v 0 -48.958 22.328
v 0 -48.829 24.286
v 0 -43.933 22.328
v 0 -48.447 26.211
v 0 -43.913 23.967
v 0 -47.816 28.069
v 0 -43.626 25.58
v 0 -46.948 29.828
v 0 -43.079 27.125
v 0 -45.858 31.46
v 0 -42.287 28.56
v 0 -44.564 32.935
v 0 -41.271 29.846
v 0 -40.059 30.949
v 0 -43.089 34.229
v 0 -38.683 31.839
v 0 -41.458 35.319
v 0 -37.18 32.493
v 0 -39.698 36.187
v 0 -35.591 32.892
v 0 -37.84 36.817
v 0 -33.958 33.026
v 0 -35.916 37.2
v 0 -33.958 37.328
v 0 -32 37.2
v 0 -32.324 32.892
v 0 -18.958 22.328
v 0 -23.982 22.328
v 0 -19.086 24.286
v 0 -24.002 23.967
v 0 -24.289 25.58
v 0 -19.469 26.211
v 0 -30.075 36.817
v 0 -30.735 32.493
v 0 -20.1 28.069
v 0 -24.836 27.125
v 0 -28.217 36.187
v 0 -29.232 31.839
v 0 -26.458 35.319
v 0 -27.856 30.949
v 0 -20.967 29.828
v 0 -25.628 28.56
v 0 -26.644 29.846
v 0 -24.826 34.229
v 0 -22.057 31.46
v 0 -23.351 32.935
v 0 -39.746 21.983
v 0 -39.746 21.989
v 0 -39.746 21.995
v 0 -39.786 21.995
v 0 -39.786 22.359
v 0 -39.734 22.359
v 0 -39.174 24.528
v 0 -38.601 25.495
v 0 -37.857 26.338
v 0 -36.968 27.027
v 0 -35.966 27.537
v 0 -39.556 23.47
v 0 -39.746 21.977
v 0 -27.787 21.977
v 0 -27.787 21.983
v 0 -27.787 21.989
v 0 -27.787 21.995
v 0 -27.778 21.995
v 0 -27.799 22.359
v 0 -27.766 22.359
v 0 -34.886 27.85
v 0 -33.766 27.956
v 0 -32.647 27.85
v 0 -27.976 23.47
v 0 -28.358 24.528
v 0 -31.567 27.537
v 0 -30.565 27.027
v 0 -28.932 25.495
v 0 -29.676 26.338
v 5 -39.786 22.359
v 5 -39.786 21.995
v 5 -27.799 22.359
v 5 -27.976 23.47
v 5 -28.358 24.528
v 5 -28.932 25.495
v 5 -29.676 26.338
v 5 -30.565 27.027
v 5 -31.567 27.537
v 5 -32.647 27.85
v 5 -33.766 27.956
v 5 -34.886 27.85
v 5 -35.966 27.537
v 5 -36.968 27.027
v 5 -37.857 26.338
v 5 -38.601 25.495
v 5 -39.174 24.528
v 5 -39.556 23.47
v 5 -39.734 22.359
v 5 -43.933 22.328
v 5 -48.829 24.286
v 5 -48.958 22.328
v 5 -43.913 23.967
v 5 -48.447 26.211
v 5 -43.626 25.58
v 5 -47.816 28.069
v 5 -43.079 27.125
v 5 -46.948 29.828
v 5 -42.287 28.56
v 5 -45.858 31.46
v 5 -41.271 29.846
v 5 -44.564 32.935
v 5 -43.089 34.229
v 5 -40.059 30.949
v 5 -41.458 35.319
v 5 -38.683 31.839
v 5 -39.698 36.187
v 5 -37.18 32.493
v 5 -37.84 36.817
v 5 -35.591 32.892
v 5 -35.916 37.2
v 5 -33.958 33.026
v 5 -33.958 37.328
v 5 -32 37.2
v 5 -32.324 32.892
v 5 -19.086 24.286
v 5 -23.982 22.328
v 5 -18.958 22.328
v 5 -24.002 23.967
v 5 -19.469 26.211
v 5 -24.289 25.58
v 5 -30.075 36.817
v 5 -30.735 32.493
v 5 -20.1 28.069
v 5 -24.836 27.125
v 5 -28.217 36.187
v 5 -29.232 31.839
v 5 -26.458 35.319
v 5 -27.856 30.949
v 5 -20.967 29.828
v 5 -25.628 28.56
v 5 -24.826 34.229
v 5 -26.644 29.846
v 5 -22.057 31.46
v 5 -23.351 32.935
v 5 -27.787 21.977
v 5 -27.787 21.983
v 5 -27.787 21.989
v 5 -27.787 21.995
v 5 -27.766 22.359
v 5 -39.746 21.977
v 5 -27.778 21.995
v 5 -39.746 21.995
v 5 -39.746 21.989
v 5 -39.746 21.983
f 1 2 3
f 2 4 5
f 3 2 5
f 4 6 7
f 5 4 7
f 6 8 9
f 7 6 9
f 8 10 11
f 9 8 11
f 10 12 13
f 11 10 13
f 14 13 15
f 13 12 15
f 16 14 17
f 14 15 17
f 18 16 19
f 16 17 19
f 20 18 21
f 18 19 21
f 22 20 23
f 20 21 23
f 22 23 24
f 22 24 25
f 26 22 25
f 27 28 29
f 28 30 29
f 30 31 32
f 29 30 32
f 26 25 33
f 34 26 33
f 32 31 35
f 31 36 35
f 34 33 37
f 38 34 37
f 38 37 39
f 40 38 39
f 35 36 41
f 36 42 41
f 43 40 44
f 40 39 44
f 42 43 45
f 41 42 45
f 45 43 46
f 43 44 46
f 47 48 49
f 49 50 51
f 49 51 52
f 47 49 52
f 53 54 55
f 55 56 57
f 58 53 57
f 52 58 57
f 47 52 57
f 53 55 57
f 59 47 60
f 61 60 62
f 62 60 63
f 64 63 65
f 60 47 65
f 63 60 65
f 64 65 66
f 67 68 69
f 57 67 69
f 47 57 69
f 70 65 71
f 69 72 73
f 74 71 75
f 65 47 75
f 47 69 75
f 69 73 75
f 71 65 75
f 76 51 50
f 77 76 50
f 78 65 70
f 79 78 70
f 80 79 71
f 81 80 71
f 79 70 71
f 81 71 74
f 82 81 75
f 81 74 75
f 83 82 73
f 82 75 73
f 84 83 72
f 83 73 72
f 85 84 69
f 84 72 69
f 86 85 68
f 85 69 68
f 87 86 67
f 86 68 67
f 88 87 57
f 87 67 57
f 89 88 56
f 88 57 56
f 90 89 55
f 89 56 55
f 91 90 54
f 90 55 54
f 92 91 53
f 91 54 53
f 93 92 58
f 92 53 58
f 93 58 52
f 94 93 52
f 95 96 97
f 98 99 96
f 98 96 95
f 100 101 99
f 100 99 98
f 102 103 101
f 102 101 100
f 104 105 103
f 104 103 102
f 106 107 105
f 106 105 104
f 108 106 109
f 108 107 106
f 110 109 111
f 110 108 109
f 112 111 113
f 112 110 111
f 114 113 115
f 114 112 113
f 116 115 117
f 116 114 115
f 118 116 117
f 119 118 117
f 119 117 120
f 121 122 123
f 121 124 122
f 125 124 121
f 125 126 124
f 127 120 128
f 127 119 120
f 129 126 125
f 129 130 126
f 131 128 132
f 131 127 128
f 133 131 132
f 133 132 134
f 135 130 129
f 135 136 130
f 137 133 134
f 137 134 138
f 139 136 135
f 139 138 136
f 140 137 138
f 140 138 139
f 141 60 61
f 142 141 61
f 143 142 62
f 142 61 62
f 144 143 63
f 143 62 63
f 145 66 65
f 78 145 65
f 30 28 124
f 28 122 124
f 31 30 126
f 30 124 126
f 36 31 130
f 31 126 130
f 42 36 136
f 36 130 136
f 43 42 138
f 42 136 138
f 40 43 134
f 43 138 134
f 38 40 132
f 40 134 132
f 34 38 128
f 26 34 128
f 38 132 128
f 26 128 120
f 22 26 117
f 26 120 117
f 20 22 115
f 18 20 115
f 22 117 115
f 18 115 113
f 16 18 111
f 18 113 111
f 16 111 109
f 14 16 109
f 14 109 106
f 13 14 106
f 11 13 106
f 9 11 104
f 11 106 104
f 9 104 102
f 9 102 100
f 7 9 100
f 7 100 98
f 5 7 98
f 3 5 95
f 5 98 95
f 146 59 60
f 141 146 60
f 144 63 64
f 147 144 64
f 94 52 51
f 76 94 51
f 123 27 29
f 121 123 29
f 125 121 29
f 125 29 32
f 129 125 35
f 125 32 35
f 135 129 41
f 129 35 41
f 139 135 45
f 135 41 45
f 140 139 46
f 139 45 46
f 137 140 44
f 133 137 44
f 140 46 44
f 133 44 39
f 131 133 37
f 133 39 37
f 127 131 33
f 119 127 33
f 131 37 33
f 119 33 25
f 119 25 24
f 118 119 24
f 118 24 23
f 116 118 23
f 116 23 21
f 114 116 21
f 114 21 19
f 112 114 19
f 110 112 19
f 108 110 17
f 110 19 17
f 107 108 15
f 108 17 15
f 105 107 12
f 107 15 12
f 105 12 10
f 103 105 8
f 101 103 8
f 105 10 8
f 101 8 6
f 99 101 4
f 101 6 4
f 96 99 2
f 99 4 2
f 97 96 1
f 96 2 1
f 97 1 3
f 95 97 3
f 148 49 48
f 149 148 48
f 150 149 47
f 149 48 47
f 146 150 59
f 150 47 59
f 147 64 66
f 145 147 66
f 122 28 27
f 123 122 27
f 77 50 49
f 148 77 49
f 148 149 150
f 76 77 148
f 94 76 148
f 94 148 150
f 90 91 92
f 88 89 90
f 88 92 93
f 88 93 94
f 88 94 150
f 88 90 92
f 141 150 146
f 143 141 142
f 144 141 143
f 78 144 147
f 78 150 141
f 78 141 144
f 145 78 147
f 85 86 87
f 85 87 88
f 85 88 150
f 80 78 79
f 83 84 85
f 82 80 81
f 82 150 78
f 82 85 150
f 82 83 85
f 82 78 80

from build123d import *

# Parameters (mm, degrees)
F1_DEPTH = 5
F3_D     = 20
F5_DEPTH = 5
F7_DEPTH = 5


with BuildPart() as f1:
    # F0 (on Right) → F1 (new body)
    with BuildSketch(Plane.YZ):
        with BuildLine():
            Line((-26.1599914792, 22.3283730447), (-18.957734704, 22.3283730447))
            ThreePointArc((-18.957734704, 22.3283730447), (-33.957734704, 37.3283730447), (-48.957734704, 22.3283730447))
            Line((-48.957734704, 22.3283730447), (-41.7554779289, 22.3283730447))
            ThreePointArc((-41.7554779289, 22.3283730447), (-41.4137994616, 24.6113311545), (-40.4187071272, 26.6942217305))
            ThreePointArc((-40.4187071272, 26.6942217305), (-37.6156734945, 29.2149021564), (-33.957734704, 30.1261162696))
            ThreePointArc((-33.957734704, 30.1261162696), (-30.6212184127, 29.3762421155), (-27.9264178741, 27.2708437525))
            ThreePointArc((-27.9264178741, 27.2708437525), (-26.614865396, 24.9526957624), (-26.1599914792, 22.3283730447))
        make_face()
        with BuildLine():
            Line((-33.957734704, 22.3283730447), (-26.1599914792, 22.3283730447))
            ThreePointArc((-26.1599914792, 22.3283730447), (-26.614865396, 24.9526957624), (-27.9264178741, 27.2708437525))
            Line((-27.9264178741, 27.2708437525), (-33.957734704, 22.3283730447))
        make_face()
        with BuildLine():
            Line((-33.957734704, 30.1261162696), (-33.957734704, 22.3283730447))
            Line((-33.957734704, 22.3283730447), (-27.9264178741, 27.2708437525))
            ThreePointArc((-27.9264178741, 27.2708437525), (-30.6212184127, 29.3762421155), (-33.957734704, 30.1261162696))
        make_face()
        with BuildLine():
            Line((-40.4187071272, 26.6942217305), (-33.957734704, 22.3283730447))
            Line((-33.957734704, 22.3283730447), (-33.957734704, 30.1261162696))
            ThreePointArc((-33.957734704, 30.1261162696), (-37.6156734945, 29.2149021564), (-40.4187071272, 26.6942217305))
        make_face()
        with BuildLine():
            ThreePointArc((-40.4187071272, 26.6942217305), (-41.4137994616, 24.6113311545), (-41.7554779289, 22.3283730447))
            Line((-41.7554779289, 22.3283730447), (-33.957734704, 22.3283730447))
            Line((-33.957734704, 22.3283730447), (-40.4187071272, 26.6942217305))
        make_face()
    extrude(amount=F1_DEPTH)

    # F3 (through all)
    with Locations(Plane(origin=(0, 0, 0), x_dir=(0, 1, 0), z_dir=(-1, 0, 0))):
        with Locations((-33.9577498666, -23.0261329564)):
            Hole(F3_D / 2)


with BuildPart() as f5:
    # F4 (on Right) → F5 (new body)
    with BuildSketch(Plane.YZ):
        with BuildLine():
            Line((-39.74583946, 21.9767466187), (-27.786871271, 21.9767466187))
            ThreePointArc((-27.786871271, 21.9767466187), (-33.7663553655, 27.9562307132), (-39.74583946, 21.9767466187))
        make_face()
    extrude(amount=F5_DEPTH)

    # F6 (on Right) → F7 (join)
    with BuildSketch(Plane.YZ):
        Polygon((-27.7784001082, 21.9946540892), (-27.7656540275, 22.359451279), (-39.7858694196, 22.359451279), (-39.7858694196, 21.9946540892), align=None)
    extrude(amount=F7_DEPTH)


solid = Compound([f1.part, f5.part])
